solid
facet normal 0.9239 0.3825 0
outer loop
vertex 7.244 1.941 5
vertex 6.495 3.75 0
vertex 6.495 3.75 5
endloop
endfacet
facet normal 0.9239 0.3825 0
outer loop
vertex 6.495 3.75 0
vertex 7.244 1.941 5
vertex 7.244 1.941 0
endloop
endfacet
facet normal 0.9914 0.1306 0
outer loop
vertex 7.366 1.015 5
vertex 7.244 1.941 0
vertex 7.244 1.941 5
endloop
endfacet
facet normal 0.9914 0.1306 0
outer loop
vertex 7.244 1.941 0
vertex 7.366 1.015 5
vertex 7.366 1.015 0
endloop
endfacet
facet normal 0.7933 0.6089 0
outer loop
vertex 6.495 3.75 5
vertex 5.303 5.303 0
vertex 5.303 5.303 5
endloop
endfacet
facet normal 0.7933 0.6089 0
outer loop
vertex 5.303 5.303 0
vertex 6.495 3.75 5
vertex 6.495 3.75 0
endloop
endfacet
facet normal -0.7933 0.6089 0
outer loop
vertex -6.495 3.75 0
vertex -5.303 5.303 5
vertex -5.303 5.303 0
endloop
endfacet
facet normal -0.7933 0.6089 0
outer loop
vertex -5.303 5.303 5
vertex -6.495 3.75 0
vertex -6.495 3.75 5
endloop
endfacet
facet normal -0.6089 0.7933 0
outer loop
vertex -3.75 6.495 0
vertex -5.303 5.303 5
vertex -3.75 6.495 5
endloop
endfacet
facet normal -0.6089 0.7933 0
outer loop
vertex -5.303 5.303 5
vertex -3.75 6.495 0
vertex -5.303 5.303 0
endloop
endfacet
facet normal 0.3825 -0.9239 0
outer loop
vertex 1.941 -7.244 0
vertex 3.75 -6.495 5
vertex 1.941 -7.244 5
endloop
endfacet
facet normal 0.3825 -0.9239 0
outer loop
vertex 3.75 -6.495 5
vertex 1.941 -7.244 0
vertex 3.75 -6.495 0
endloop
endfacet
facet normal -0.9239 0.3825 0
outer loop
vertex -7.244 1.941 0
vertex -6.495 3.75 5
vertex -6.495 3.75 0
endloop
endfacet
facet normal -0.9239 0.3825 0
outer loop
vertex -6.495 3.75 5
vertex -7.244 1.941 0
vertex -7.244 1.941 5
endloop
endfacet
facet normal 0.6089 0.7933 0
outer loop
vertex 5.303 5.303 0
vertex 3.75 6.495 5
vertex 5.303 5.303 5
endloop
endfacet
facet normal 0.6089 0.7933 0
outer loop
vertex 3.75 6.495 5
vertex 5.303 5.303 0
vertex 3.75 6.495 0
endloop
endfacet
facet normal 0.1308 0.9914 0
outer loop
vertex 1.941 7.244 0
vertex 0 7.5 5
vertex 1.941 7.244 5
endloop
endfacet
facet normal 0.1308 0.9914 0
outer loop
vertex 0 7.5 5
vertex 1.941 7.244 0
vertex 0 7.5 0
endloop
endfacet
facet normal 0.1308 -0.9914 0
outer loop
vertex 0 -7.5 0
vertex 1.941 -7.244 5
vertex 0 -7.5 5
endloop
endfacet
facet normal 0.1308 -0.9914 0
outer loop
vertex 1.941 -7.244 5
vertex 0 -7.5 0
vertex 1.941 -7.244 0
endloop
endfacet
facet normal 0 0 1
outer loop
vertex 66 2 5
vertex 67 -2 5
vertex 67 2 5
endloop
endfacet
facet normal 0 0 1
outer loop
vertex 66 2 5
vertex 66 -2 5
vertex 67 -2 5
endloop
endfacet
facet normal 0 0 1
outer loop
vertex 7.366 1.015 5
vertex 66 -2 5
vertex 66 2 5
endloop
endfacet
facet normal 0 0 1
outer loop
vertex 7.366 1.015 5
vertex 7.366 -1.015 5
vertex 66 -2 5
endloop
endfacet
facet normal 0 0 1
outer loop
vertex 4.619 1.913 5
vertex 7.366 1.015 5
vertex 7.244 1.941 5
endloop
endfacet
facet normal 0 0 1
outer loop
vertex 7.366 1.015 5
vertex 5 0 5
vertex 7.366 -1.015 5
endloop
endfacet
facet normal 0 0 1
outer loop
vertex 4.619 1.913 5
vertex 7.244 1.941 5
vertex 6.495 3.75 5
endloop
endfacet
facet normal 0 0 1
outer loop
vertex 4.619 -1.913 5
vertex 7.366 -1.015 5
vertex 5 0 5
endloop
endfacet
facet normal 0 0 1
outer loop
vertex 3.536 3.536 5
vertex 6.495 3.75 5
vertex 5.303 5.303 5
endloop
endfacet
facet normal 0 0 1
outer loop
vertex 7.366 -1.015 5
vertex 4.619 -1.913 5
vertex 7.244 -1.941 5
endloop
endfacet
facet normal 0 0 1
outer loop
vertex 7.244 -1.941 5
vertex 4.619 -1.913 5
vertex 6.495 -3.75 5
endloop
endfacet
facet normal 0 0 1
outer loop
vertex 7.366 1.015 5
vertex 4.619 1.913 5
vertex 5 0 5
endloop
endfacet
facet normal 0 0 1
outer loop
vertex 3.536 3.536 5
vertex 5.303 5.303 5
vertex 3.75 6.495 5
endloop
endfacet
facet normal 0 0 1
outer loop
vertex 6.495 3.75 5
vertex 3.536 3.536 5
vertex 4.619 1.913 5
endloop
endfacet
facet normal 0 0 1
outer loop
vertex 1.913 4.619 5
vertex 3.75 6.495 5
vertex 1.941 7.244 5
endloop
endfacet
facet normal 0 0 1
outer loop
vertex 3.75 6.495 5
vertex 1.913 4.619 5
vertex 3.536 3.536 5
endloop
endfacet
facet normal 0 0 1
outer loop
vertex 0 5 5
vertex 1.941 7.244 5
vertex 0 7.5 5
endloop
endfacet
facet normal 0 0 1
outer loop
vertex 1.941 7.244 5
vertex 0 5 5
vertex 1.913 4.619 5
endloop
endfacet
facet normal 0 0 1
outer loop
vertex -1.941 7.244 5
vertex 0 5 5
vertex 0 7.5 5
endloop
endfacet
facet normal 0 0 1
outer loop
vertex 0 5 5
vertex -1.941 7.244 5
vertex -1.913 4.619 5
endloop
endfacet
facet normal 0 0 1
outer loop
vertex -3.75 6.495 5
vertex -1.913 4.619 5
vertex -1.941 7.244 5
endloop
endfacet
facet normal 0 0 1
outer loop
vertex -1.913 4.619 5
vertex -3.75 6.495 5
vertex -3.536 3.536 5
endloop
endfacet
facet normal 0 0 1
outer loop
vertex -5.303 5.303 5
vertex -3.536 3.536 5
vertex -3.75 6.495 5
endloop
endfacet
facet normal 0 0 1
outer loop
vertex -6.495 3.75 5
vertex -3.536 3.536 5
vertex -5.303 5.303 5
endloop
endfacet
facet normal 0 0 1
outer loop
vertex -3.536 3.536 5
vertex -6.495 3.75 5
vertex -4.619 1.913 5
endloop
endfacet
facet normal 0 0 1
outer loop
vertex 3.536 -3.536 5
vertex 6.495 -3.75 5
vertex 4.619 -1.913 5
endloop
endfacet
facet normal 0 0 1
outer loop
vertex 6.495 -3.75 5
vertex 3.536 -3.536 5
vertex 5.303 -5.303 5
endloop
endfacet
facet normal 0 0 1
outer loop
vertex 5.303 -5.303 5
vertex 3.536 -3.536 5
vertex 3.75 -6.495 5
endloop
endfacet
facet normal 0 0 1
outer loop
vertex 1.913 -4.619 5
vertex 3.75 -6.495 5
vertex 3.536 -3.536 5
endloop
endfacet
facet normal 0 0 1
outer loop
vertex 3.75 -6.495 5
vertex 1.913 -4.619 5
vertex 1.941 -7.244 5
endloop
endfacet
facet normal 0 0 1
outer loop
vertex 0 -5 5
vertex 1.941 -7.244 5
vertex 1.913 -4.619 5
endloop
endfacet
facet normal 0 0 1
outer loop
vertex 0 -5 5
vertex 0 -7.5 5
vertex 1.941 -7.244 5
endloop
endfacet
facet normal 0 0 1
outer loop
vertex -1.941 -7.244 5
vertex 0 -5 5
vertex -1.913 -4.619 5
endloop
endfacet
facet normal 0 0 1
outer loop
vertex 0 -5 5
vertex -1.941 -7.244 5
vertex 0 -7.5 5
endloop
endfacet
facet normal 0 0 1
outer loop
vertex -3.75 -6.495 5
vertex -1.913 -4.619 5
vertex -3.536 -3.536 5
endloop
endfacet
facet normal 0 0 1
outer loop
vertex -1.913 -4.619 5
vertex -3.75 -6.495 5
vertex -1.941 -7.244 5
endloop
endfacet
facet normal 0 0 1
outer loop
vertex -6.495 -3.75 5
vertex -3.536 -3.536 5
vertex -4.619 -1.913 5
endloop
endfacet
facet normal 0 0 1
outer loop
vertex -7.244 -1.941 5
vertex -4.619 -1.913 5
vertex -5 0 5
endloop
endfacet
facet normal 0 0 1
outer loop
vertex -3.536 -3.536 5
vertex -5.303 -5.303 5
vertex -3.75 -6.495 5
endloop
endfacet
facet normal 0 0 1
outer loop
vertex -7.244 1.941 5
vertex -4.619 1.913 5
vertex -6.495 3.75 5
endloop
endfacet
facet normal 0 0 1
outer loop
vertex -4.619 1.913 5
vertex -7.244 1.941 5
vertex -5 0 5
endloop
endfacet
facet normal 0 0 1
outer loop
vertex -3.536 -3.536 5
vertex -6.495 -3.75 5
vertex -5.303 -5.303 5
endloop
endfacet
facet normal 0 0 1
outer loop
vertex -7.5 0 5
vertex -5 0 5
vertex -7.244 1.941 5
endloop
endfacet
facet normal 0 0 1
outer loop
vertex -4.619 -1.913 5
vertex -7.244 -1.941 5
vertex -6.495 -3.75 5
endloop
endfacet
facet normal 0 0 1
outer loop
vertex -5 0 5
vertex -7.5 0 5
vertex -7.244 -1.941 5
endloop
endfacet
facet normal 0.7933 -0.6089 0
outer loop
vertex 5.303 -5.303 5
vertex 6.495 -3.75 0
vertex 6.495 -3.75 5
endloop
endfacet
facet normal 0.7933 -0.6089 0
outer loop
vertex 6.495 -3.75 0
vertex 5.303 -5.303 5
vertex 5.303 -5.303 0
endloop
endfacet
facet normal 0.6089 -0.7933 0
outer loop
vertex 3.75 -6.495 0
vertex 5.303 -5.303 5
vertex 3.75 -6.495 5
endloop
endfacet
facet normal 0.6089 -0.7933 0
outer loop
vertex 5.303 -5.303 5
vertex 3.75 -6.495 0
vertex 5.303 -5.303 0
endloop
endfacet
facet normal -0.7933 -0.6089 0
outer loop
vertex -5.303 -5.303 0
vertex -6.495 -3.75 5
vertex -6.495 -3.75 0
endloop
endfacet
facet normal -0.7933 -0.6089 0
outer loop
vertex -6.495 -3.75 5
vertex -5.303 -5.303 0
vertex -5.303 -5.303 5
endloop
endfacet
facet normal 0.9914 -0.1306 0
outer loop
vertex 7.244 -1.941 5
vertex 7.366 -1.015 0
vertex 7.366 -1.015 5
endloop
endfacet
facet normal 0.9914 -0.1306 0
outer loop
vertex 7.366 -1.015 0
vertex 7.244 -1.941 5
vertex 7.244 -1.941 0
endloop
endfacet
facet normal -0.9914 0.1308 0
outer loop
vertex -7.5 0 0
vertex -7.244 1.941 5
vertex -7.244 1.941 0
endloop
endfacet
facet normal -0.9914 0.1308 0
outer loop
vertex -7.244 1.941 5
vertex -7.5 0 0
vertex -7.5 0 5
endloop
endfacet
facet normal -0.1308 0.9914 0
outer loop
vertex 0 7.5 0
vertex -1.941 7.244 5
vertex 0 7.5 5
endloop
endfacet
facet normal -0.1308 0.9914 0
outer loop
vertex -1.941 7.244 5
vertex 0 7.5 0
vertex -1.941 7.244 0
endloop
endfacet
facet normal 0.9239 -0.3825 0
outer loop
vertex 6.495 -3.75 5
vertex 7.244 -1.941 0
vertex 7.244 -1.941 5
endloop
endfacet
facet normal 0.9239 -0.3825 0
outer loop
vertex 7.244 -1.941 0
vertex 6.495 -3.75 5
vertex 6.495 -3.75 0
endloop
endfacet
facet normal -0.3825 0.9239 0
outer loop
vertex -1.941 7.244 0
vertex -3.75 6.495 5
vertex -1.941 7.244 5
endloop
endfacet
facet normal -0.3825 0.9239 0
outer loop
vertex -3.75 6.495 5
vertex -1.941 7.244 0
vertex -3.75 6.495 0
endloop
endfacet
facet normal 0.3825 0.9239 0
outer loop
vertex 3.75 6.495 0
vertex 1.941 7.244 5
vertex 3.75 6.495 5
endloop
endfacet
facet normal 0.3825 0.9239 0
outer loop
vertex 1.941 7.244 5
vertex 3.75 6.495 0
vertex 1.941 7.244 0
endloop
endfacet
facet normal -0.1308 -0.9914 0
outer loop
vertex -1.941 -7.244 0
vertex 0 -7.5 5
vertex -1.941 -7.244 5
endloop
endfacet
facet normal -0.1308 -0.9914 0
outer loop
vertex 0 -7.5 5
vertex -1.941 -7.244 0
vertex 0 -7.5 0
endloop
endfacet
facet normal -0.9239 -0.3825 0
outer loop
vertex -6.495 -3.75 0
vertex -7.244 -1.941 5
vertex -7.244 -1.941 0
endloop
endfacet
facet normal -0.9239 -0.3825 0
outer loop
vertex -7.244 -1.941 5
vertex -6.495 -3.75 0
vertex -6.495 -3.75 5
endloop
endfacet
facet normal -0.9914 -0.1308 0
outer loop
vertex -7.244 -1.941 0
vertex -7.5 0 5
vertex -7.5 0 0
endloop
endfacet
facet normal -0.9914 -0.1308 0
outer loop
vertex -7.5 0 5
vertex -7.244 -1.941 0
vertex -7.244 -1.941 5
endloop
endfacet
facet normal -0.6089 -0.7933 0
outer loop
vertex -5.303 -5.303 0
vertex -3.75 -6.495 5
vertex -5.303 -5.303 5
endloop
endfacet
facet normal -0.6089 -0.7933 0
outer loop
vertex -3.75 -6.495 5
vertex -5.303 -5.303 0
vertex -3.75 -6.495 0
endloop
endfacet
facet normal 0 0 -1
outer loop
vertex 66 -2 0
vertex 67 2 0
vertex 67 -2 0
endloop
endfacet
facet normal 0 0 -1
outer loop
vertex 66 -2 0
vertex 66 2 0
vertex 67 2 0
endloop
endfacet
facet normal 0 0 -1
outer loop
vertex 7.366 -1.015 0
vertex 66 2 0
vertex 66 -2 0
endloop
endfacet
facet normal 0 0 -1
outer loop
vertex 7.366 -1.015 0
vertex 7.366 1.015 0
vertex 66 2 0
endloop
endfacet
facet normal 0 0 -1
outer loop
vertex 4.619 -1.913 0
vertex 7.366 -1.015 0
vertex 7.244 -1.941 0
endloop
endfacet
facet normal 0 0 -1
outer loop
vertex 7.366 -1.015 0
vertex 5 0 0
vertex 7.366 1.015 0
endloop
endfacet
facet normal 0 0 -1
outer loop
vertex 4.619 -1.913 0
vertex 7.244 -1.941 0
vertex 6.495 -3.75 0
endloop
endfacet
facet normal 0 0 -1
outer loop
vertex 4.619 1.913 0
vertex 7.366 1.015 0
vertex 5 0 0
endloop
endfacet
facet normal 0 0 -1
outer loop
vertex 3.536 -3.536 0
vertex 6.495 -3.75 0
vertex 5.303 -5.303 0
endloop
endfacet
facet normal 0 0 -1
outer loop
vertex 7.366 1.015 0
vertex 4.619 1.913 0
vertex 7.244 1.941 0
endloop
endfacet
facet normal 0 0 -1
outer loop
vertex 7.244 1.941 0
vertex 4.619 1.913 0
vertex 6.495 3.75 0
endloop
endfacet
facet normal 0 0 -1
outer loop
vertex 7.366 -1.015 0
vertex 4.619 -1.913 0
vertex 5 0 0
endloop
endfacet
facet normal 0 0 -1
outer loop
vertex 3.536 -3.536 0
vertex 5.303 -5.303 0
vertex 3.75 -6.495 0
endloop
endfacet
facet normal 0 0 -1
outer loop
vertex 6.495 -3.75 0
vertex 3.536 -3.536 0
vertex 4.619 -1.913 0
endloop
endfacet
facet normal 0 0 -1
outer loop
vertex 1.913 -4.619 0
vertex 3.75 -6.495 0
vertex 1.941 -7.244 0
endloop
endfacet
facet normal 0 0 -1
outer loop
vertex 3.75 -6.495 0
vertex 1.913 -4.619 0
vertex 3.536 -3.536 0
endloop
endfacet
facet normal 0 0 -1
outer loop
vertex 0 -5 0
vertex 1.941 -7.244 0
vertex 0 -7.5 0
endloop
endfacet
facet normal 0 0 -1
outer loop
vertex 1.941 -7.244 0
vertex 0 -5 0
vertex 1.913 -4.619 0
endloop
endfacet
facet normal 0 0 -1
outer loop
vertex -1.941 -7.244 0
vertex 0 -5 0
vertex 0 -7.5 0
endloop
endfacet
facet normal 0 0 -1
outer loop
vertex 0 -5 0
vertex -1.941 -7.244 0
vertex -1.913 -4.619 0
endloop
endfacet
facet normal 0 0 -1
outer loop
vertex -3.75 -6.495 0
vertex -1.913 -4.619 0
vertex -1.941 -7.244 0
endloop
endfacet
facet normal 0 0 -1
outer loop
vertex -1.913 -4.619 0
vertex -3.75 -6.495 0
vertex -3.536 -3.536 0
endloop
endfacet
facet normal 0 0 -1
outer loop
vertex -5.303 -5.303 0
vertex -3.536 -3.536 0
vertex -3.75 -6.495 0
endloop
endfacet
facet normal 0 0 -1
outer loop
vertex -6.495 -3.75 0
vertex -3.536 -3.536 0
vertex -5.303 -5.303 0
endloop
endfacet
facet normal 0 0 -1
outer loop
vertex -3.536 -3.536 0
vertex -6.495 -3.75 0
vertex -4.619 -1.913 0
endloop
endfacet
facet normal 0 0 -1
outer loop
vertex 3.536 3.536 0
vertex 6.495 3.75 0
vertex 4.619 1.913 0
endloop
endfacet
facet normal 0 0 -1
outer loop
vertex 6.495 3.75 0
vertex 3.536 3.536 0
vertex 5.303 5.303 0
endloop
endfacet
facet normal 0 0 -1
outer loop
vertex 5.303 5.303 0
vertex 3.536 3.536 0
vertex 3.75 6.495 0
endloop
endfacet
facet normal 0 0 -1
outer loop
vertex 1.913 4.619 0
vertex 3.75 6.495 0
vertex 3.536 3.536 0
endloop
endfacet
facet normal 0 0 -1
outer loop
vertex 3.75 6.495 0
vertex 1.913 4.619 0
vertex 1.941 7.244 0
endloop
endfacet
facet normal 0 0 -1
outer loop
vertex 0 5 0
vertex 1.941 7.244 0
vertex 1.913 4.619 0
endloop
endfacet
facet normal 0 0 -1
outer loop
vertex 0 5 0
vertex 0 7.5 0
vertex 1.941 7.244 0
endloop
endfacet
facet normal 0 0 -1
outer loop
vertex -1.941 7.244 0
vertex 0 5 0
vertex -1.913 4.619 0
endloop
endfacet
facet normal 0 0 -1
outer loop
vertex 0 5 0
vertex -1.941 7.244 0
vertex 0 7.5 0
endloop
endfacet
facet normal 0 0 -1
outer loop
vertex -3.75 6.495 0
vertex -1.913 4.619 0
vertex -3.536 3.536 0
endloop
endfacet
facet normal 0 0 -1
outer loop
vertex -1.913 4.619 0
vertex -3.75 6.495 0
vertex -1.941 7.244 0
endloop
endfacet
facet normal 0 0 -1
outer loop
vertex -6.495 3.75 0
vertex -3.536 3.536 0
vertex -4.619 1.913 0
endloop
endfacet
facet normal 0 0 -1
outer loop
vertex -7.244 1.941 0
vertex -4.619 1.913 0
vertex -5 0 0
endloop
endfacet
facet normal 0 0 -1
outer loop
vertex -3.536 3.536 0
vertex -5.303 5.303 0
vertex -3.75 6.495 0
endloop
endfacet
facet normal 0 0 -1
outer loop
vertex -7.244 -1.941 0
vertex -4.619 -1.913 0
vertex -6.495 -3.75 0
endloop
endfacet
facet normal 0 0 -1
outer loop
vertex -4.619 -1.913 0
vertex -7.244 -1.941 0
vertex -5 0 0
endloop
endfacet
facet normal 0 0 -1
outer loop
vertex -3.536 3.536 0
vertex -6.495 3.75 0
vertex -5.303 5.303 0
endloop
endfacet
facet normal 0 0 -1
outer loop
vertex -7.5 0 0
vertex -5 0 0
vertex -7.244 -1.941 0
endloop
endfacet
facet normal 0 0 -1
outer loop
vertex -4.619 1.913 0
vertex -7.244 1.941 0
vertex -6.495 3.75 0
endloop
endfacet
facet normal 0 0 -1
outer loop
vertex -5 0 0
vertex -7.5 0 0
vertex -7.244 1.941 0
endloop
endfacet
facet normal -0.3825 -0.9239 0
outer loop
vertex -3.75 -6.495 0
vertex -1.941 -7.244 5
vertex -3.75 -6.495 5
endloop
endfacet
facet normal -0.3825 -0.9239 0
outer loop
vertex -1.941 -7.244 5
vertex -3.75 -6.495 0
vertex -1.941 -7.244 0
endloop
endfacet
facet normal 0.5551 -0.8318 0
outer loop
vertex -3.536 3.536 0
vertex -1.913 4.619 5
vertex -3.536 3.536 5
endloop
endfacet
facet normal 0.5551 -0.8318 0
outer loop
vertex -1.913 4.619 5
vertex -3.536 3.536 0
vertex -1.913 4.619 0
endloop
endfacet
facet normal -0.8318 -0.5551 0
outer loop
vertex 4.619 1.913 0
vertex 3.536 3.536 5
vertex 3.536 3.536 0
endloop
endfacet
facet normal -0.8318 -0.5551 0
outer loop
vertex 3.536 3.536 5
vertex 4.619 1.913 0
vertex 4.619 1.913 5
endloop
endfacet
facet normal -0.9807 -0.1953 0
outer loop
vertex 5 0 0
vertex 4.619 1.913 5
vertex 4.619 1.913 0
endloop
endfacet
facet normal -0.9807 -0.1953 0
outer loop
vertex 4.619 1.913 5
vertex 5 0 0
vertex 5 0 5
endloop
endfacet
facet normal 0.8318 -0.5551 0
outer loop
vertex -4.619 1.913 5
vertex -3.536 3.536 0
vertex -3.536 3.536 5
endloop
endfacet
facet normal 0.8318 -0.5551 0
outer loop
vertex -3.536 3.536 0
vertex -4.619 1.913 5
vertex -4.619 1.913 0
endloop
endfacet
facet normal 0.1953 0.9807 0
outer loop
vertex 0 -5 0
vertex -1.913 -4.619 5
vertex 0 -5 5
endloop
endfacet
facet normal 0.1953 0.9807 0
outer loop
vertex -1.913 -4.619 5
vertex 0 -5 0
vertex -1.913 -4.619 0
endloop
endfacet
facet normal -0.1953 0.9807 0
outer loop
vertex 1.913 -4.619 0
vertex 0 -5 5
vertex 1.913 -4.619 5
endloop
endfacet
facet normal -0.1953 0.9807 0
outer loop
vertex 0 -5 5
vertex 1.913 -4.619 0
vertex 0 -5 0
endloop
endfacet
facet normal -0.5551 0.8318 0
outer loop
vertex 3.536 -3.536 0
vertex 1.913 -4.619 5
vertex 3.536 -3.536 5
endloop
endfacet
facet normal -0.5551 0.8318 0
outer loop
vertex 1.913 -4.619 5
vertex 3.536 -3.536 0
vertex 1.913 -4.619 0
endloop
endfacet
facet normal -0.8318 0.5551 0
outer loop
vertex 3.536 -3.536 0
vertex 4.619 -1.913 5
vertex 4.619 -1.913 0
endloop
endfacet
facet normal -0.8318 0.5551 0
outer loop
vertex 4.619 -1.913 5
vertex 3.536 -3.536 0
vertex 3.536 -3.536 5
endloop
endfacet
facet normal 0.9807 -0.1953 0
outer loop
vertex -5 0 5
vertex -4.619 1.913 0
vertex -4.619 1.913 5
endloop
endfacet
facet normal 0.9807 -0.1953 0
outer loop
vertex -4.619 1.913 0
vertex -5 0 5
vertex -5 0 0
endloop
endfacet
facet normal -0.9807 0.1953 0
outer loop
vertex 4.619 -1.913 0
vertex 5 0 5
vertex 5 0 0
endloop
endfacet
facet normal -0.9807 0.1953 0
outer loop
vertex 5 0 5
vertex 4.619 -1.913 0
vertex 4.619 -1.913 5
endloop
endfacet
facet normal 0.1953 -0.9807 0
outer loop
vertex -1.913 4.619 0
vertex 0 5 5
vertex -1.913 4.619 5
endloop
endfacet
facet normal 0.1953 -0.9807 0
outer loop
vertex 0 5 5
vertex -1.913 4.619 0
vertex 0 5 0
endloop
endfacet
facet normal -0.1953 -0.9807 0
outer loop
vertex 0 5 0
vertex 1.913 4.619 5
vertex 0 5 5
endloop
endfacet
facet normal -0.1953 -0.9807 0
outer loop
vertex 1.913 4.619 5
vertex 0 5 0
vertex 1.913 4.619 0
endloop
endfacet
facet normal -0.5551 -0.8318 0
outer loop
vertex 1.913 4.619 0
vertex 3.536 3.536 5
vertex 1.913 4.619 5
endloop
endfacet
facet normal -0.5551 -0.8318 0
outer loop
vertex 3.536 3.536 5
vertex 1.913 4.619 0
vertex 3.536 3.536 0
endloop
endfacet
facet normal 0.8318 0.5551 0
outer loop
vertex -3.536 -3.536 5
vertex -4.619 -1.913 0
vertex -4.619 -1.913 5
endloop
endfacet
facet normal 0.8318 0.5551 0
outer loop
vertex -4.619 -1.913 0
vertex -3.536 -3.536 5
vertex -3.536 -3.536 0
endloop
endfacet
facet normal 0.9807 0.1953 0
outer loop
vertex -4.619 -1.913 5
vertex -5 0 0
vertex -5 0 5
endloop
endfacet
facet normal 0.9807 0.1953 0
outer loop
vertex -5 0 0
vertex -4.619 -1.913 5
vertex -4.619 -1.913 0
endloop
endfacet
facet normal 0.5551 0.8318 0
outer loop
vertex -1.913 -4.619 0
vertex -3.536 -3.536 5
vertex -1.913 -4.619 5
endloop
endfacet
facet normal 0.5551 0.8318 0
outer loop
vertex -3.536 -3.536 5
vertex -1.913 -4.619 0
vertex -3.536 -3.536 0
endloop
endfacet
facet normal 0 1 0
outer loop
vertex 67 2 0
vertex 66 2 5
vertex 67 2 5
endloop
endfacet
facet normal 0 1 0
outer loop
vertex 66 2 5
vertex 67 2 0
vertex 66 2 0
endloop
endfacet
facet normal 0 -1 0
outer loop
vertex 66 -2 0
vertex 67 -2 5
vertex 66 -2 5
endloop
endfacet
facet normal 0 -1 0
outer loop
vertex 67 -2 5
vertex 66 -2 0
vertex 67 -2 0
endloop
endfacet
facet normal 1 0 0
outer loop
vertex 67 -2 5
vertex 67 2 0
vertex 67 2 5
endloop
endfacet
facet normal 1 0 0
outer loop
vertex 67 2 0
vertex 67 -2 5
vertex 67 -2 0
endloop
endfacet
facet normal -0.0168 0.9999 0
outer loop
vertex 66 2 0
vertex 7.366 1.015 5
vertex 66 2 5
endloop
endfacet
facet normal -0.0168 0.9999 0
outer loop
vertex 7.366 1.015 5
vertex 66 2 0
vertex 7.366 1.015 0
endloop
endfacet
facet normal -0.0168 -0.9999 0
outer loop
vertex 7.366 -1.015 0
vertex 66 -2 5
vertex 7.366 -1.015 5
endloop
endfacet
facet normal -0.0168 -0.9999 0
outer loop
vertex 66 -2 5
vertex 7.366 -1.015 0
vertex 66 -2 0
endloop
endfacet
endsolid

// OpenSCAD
length = 50;
tipWidth = 4;
baseWid = 2;
height = 5;
diameter = 15;
wheelD = 10;
hull() {
	translate([length+diameter+1,-tipWidth/2,0])cube([1,tipWidth,height]);
	translate([diameter/2-1,-baseWid/2,0])cube([1,baseWid,height]);
}
difference() {
	translate([0,0,0])cylinder(d=diameter,h=height);
	translate([0,0,-1])cylinder(d=wheelD,h=height+2);
}
